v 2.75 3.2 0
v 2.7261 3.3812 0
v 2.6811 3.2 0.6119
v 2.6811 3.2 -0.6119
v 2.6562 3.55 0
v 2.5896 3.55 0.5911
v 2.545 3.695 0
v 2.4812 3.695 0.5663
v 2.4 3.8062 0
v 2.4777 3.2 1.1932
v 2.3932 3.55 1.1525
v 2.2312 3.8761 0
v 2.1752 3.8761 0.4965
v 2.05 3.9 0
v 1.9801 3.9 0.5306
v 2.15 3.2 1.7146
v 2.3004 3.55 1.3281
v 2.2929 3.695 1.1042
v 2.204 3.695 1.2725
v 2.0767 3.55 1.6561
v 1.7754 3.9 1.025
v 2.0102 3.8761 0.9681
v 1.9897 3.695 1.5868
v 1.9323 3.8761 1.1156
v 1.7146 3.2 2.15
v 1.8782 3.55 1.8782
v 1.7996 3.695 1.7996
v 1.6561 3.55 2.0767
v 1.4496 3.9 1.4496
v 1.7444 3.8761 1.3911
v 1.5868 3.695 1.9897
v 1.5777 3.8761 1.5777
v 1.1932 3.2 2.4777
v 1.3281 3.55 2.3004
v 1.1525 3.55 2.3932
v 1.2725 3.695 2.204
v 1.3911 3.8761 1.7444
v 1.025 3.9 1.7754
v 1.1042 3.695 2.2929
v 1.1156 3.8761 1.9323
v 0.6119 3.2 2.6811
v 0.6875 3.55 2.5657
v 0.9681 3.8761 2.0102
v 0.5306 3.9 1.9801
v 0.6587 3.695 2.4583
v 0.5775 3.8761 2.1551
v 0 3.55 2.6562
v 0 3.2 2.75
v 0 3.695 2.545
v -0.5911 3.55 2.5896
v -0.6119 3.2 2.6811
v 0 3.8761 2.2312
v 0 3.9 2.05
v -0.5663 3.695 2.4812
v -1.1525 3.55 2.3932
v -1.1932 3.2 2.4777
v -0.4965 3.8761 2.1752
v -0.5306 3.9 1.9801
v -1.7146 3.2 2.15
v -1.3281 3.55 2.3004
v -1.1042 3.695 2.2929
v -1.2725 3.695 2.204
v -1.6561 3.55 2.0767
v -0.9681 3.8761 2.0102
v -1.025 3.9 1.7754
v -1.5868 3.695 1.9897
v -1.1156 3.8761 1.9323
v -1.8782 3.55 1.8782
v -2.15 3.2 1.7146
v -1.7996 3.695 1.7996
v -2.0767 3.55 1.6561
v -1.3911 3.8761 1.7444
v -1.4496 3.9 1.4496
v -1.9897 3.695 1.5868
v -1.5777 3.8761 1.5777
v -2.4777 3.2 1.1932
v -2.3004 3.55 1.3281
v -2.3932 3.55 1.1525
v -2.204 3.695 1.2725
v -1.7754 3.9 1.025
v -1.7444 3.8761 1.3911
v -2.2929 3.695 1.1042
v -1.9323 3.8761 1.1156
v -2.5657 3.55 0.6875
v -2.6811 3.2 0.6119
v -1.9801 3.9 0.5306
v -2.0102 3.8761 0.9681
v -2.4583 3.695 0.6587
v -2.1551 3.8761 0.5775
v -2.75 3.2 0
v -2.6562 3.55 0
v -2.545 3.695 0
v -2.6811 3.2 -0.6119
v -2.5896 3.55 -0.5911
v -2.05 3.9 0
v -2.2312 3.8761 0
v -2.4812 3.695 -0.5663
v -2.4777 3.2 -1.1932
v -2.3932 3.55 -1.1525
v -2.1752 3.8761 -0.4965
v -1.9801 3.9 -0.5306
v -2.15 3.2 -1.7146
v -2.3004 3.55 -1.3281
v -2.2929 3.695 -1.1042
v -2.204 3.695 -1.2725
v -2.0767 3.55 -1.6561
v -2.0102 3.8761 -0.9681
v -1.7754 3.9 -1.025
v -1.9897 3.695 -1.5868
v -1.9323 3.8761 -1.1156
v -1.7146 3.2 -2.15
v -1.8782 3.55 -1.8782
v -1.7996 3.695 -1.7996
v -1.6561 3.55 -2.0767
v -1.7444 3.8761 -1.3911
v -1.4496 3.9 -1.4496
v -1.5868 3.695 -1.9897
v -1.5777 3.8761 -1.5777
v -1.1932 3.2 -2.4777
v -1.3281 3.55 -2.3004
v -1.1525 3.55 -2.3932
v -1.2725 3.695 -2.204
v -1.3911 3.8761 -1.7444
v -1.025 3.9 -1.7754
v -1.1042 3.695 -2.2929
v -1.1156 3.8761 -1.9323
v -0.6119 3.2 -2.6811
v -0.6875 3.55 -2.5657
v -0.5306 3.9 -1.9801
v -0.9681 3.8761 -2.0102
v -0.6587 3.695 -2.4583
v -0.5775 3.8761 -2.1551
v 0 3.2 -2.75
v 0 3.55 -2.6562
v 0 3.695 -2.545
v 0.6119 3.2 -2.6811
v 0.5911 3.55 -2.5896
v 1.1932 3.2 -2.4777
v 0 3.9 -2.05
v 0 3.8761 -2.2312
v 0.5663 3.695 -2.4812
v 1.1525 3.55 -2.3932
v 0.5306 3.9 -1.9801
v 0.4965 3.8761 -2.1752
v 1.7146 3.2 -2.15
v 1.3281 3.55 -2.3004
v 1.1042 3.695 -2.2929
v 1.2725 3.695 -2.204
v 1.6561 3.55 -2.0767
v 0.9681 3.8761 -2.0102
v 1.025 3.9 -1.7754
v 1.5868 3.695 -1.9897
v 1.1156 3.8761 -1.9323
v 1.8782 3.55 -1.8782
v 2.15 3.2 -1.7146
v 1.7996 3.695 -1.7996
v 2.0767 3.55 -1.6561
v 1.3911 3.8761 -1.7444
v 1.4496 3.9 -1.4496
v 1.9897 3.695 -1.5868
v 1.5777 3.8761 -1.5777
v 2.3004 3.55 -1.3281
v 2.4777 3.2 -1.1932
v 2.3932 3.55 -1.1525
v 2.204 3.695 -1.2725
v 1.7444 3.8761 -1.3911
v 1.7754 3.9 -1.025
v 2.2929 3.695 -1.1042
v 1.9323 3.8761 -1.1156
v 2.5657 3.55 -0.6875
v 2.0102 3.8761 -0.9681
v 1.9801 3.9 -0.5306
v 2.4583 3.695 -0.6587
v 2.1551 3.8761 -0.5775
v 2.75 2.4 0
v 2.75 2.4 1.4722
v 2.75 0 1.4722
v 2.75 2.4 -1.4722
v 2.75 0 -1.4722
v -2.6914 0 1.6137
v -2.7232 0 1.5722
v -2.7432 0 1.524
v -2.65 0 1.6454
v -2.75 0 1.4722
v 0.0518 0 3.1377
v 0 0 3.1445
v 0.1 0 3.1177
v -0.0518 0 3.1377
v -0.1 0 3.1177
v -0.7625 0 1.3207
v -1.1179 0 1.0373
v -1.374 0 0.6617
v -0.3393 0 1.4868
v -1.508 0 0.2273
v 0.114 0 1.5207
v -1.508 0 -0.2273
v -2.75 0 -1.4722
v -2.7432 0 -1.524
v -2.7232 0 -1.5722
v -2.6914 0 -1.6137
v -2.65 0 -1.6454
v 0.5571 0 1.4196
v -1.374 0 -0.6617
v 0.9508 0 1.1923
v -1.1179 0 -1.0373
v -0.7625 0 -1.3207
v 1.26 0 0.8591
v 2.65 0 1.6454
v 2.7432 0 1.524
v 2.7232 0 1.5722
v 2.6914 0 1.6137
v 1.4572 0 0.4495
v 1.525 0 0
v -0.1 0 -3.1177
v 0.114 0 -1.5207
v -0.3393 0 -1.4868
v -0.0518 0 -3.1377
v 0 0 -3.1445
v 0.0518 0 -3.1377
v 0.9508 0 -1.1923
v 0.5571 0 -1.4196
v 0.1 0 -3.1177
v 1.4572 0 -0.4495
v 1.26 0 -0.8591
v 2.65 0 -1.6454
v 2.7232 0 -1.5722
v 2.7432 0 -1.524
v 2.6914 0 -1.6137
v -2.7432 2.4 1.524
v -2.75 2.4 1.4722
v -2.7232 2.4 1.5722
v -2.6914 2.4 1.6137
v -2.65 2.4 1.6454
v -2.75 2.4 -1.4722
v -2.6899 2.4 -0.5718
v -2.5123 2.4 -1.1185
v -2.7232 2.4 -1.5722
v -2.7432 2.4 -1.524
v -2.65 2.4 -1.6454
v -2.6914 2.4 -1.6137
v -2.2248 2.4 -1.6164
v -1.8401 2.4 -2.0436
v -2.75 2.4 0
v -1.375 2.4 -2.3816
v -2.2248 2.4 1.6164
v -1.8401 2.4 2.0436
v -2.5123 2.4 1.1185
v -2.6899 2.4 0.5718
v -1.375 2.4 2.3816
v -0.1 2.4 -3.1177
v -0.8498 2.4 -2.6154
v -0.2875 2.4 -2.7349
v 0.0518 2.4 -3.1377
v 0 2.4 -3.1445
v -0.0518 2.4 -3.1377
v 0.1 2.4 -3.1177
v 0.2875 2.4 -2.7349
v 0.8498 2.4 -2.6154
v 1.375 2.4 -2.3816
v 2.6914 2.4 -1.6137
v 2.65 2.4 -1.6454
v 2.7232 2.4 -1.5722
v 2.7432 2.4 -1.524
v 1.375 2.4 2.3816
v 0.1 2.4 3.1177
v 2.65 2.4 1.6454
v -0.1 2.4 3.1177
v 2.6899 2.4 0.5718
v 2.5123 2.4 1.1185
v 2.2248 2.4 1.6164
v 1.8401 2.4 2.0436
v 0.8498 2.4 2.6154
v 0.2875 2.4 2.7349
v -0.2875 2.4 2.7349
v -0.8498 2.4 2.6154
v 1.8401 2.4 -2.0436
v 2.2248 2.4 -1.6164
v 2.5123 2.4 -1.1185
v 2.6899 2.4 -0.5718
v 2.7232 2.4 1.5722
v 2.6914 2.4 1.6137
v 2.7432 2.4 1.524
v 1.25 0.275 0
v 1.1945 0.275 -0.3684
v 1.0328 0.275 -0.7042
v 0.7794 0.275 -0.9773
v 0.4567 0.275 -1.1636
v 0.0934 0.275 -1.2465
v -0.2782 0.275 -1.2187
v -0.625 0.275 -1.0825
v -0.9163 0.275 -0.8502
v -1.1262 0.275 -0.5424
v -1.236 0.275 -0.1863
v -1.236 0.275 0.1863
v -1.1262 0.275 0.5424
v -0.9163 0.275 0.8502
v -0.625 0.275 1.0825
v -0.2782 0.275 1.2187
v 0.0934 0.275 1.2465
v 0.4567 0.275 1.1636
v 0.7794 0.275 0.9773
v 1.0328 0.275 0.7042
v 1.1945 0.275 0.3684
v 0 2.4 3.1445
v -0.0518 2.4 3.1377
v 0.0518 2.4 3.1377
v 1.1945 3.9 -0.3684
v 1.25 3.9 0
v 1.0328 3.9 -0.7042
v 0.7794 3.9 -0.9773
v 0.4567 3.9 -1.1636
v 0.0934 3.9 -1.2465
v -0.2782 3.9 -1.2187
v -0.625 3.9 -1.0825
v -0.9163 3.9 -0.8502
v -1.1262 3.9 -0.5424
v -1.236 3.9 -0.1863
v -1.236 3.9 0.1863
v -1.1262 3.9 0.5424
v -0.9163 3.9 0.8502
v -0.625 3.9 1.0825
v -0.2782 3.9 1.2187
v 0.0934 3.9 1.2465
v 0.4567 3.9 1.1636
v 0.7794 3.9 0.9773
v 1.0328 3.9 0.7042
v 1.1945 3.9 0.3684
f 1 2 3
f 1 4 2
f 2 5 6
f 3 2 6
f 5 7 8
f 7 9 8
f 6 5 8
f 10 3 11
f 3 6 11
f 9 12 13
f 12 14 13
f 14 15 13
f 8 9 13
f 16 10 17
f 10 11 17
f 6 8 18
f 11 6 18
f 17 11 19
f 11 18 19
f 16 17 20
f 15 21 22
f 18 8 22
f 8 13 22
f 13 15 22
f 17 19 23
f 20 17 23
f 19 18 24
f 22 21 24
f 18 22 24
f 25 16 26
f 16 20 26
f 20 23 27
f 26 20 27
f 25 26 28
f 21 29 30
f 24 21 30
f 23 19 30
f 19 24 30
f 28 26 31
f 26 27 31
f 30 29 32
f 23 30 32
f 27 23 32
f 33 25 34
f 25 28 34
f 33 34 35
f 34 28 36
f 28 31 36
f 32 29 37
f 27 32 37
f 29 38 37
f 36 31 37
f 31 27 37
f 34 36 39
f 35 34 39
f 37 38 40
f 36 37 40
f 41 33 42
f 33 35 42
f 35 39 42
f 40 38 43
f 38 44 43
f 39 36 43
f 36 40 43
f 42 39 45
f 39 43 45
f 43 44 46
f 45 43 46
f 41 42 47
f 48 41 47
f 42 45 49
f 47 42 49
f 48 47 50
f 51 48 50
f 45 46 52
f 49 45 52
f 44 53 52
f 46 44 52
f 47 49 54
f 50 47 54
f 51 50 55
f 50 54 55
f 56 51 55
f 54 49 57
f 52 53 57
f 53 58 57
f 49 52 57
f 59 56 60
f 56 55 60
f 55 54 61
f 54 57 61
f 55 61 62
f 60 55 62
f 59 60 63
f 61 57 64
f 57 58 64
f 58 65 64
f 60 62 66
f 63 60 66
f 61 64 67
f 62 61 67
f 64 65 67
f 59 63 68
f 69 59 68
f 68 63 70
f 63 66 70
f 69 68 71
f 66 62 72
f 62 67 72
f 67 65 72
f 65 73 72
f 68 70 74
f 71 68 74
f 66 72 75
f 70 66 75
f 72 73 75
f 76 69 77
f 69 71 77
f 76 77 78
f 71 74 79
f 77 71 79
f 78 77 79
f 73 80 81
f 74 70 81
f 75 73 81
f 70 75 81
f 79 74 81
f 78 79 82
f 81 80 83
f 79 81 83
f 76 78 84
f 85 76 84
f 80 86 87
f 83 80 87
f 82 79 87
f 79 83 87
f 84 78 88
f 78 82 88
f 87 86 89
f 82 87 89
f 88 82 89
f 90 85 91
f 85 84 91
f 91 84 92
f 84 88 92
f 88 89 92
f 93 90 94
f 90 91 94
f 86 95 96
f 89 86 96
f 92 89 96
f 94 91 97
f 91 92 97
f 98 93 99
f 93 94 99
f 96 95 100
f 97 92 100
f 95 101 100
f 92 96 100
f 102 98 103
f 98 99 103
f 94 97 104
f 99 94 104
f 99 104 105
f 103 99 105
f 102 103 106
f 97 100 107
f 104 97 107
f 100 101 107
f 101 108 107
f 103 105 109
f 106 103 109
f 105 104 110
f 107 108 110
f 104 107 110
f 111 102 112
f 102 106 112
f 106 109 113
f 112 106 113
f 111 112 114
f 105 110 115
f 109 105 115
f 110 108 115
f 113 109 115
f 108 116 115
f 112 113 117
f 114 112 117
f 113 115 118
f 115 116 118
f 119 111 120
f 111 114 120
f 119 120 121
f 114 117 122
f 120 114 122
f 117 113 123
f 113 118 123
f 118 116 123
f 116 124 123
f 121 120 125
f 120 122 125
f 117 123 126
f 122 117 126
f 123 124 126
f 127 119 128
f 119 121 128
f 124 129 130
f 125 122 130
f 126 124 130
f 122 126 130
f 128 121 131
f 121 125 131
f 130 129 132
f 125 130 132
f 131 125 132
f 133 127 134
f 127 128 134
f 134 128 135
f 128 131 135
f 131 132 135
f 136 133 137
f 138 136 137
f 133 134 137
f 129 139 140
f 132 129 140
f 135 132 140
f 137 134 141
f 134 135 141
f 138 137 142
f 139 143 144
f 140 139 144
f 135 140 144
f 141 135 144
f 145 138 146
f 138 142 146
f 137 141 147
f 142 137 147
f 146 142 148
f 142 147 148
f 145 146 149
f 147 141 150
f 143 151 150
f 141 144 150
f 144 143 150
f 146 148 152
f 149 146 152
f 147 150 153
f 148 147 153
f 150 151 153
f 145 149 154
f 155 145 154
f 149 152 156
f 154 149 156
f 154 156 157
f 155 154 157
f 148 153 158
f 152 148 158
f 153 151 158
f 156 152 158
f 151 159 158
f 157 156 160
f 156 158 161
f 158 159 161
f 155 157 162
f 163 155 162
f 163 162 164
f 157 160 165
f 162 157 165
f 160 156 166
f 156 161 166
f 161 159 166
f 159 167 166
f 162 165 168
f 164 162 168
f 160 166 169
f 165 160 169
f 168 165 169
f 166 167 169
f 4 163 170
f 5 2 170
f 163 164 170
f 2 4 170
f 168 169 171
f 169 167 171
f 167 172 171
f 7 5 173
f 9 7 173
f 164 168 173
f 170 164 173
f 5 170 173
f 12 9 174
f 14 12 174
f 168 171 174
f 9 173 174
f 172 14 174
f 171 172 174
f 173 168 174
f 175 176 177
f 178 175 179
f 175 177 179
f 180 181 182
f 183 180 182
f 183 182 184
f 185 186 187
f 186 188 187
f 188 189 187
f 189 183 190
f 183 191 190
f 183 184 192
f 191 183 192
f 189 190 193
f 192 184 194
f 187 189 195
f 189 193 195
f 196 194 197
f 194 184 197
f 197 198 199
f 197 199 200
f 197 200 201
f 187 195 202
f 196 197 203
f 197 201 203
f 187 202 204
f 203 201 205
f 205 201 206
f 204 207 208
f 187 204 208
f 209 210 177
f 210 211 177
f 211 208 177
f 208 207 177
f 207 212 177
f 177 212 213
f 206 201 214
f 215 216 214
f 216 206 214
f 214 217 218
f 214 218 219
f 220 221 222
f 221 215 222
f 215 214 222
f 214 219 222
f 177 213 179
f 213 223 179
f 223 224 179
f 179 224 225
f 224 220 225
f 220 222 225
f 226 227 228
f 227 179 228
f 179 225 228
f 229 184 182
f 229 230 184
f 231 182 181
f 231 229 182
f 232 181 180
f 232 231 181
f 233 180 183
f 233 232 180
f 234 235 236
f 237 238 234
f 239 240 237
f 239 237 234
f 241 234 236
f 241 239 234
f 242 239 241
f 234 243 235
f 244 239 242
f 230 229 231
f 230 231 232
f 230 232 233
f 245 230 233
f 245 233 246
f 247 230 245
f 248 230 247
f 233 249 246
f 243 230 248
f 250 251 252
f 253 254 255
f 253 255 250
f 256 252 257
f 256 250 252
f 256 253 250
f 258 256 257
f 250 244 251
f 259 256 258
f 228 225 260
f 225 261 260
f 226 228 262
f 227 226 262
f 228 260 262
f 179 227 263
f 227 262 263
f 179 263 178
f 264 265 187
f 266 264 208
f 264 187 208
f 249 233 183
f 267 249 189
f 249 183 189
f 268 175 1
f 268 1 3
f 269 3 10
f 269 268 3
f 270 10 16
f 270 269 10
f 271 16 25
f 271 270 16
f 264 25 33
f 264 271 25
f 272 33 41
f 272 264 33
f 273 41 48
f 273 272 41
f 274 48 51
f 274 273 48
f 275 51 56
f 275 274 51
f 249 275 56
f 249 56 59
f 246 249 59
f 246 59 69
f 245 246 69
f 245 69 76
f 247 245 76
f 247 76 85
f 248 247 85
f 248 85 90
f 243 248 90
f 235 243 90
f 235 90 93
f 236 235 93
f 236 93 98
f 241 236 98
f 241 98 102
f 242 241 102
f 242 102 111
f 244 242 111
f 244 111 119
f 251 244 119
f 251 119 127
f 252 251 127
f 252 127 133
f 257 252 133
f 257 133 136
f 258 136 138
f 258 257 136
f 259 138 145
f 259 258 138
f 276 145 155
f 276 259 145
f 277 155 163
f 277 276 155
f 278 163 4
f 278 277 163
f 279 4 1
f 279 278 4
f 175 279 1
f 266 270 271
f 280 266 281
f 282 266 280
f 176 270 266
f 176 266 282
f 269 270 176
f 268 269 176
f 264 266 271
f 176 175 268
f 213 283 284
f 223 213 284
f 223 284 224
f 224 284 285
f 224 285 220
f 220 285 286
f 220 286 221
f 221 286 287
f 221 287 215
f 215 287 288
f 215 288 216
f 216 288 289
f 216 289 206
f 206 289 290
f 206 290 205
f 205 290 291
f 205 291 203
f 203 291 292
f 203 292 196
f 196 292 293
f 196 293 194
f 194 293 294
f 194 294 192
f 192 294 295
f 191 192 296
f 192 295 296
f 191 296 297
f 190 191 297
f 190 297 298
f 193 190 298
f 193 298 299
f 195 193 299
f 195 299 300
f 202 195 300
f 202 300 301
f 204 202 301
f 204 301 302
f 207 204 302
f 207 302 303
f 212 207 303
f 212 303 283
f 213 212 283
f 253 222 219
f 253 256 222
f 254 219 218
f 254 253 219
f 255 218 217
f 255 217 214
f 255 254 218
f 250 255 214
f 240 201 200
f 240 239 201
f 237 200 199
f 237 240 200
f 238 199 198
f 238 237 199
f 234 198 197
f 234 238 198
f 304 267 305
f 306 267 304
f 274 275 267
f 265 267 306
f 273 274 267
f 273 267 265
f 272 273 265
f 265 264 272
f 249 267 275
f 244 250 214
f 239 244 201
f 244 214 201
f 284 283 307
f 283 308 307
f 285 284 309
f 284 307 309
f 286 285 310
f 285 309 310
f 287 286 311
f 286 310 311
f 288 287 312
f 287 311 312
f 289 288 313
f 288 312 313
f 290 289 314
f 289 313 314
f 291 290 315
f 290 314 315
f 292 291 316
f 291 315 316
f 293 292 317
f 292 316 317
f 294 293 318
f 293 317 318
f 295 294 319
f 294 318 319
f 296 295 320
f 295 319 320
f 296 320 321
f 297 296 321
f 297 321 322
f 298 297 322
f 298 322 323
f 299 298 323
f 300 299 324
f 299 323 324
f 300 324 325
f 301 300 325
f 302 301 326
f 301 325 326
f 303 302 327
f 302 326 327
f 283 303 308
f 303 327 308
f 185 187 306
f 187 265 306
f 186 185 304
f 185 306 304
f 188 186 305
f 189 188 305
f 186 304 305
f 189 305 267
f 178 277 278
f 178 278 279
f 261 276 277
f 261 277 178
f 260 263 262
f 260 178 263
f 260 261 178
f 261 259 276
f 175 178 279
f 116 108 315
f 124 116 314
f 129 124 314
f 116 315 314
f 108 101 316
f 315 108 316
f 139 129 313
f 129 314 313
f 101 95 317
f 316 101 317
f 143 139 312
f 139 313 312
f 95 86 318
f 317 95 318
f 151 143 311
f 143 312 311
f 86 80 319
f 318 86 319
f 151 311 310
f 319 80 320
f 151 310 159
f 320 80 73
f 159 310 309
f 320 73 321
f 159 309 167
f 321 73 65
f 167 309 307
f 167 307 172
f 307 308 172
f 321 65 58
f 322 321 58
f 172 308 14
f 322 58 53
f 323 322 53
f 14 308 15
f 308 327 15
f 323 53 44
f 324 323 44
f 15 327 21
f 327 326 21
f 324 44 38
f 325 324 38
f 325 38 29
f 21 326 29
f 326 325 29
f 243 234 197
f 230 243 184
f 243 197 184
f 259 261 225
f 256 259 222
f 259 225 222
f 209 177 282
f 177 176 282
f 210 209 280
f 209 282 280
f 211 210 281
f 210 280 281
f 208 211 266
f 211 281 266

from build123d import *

# Parameters (mm, degrees)
EXTRUDE_1_DEPTH              = 2.4
SKETCH_2_R                   = 2.75
EXTRUDE_2_DEPTH              = 3.9
FILLET_1_R                   = 0.7
FILLET_2_R                   = 0.2
HOLE_WIZARD_M3_1_D           = 2.5
HOLE_WIZARD_M3_1_DEPTH       = 7.5
HOLE_WIZARD_M3_1_CSINK_D     = 3.05
HOLE_WIZARD_M3_1_CSINK_ANGLE = 90
HOLE_WIZARD_M3_1_TIP         = 0.751075774


with BuildPart() as part:
    # 草图1 → 凸台-拉伸1 (new body)
    with BuildSketch(Plane(origin=(0, 0, 0), x_dir=(1, 0, 0), z_dir=(0, 1, 0))):
        Polygon((2.75, -1.58771324), (2.75, 1.58771324), (0, 3.175426481), (-2.75, 1.58771324), (-2.75, -1.58771324), (0, -3.175426481), align=None)
    extrude(amount=EXTRUDE_1_DEPTH)

    # 草图2 → 凸台-拉伸2 (add)
    with BuildSketch(Plane.XZ):
        Circle(SKETCH_2_R)
    extrude(amount=-EXTRUDE_2_DEPTH)

    # 圆角1
    fillet_1_edges = [part.edges().sort_by_distance(p)[0] for p in [
        (-2.75, 3.9, 0),
    ]]
    fillet(fillet_1_edges, radius=FILLET_1_R)

    # 圆角2
    fillet_2_edges = [part.edges().sort_by_distance(p)[0] for p in [
        (0, 1.2, 3.175426481),
        (-2.75, 1.2, 1.58771324),
        (-2.75, 1.2, -1.58771324),
        (0, 1.2, -3.175426481),
        (2.75, 1.2, -1.58771324),
        (2.75, 1.2, 1.58771324),
    ]]
    fillet(fillet_2_edges, radius=FILLET_2_R)

    # M3 螺纹孔1
    with Locations(Plane(origin=(0, 0, 0), x_dir=(-1, 0, 0), z_dir=(0, -1, 0))):
        with Locations((0, 0)):
            CounterSinkHole(HOLE_WIZARD_M3_1_D / 2, HOLE_WIZARD_M3_1_CSINK_D / 2, depth=HOLE_WIZARD_M3_1_DEPTH, counter_sink_angle=HOLE_WIZARD_M3_1_CSINK_ANGLE)
            with Locations((0, 0, -(HOLE_WIZARD_M3_1_DEPTH + HOLE_WIZARD_M3_1_TIP / 2))):  # 118° drill point
                Cone(0, HOLE_WIZARD_M3_1_D / 2, HOLE_WIZARD_M3_1_TIP, mode=Mode.SUBTRACT)


solid = part.part
